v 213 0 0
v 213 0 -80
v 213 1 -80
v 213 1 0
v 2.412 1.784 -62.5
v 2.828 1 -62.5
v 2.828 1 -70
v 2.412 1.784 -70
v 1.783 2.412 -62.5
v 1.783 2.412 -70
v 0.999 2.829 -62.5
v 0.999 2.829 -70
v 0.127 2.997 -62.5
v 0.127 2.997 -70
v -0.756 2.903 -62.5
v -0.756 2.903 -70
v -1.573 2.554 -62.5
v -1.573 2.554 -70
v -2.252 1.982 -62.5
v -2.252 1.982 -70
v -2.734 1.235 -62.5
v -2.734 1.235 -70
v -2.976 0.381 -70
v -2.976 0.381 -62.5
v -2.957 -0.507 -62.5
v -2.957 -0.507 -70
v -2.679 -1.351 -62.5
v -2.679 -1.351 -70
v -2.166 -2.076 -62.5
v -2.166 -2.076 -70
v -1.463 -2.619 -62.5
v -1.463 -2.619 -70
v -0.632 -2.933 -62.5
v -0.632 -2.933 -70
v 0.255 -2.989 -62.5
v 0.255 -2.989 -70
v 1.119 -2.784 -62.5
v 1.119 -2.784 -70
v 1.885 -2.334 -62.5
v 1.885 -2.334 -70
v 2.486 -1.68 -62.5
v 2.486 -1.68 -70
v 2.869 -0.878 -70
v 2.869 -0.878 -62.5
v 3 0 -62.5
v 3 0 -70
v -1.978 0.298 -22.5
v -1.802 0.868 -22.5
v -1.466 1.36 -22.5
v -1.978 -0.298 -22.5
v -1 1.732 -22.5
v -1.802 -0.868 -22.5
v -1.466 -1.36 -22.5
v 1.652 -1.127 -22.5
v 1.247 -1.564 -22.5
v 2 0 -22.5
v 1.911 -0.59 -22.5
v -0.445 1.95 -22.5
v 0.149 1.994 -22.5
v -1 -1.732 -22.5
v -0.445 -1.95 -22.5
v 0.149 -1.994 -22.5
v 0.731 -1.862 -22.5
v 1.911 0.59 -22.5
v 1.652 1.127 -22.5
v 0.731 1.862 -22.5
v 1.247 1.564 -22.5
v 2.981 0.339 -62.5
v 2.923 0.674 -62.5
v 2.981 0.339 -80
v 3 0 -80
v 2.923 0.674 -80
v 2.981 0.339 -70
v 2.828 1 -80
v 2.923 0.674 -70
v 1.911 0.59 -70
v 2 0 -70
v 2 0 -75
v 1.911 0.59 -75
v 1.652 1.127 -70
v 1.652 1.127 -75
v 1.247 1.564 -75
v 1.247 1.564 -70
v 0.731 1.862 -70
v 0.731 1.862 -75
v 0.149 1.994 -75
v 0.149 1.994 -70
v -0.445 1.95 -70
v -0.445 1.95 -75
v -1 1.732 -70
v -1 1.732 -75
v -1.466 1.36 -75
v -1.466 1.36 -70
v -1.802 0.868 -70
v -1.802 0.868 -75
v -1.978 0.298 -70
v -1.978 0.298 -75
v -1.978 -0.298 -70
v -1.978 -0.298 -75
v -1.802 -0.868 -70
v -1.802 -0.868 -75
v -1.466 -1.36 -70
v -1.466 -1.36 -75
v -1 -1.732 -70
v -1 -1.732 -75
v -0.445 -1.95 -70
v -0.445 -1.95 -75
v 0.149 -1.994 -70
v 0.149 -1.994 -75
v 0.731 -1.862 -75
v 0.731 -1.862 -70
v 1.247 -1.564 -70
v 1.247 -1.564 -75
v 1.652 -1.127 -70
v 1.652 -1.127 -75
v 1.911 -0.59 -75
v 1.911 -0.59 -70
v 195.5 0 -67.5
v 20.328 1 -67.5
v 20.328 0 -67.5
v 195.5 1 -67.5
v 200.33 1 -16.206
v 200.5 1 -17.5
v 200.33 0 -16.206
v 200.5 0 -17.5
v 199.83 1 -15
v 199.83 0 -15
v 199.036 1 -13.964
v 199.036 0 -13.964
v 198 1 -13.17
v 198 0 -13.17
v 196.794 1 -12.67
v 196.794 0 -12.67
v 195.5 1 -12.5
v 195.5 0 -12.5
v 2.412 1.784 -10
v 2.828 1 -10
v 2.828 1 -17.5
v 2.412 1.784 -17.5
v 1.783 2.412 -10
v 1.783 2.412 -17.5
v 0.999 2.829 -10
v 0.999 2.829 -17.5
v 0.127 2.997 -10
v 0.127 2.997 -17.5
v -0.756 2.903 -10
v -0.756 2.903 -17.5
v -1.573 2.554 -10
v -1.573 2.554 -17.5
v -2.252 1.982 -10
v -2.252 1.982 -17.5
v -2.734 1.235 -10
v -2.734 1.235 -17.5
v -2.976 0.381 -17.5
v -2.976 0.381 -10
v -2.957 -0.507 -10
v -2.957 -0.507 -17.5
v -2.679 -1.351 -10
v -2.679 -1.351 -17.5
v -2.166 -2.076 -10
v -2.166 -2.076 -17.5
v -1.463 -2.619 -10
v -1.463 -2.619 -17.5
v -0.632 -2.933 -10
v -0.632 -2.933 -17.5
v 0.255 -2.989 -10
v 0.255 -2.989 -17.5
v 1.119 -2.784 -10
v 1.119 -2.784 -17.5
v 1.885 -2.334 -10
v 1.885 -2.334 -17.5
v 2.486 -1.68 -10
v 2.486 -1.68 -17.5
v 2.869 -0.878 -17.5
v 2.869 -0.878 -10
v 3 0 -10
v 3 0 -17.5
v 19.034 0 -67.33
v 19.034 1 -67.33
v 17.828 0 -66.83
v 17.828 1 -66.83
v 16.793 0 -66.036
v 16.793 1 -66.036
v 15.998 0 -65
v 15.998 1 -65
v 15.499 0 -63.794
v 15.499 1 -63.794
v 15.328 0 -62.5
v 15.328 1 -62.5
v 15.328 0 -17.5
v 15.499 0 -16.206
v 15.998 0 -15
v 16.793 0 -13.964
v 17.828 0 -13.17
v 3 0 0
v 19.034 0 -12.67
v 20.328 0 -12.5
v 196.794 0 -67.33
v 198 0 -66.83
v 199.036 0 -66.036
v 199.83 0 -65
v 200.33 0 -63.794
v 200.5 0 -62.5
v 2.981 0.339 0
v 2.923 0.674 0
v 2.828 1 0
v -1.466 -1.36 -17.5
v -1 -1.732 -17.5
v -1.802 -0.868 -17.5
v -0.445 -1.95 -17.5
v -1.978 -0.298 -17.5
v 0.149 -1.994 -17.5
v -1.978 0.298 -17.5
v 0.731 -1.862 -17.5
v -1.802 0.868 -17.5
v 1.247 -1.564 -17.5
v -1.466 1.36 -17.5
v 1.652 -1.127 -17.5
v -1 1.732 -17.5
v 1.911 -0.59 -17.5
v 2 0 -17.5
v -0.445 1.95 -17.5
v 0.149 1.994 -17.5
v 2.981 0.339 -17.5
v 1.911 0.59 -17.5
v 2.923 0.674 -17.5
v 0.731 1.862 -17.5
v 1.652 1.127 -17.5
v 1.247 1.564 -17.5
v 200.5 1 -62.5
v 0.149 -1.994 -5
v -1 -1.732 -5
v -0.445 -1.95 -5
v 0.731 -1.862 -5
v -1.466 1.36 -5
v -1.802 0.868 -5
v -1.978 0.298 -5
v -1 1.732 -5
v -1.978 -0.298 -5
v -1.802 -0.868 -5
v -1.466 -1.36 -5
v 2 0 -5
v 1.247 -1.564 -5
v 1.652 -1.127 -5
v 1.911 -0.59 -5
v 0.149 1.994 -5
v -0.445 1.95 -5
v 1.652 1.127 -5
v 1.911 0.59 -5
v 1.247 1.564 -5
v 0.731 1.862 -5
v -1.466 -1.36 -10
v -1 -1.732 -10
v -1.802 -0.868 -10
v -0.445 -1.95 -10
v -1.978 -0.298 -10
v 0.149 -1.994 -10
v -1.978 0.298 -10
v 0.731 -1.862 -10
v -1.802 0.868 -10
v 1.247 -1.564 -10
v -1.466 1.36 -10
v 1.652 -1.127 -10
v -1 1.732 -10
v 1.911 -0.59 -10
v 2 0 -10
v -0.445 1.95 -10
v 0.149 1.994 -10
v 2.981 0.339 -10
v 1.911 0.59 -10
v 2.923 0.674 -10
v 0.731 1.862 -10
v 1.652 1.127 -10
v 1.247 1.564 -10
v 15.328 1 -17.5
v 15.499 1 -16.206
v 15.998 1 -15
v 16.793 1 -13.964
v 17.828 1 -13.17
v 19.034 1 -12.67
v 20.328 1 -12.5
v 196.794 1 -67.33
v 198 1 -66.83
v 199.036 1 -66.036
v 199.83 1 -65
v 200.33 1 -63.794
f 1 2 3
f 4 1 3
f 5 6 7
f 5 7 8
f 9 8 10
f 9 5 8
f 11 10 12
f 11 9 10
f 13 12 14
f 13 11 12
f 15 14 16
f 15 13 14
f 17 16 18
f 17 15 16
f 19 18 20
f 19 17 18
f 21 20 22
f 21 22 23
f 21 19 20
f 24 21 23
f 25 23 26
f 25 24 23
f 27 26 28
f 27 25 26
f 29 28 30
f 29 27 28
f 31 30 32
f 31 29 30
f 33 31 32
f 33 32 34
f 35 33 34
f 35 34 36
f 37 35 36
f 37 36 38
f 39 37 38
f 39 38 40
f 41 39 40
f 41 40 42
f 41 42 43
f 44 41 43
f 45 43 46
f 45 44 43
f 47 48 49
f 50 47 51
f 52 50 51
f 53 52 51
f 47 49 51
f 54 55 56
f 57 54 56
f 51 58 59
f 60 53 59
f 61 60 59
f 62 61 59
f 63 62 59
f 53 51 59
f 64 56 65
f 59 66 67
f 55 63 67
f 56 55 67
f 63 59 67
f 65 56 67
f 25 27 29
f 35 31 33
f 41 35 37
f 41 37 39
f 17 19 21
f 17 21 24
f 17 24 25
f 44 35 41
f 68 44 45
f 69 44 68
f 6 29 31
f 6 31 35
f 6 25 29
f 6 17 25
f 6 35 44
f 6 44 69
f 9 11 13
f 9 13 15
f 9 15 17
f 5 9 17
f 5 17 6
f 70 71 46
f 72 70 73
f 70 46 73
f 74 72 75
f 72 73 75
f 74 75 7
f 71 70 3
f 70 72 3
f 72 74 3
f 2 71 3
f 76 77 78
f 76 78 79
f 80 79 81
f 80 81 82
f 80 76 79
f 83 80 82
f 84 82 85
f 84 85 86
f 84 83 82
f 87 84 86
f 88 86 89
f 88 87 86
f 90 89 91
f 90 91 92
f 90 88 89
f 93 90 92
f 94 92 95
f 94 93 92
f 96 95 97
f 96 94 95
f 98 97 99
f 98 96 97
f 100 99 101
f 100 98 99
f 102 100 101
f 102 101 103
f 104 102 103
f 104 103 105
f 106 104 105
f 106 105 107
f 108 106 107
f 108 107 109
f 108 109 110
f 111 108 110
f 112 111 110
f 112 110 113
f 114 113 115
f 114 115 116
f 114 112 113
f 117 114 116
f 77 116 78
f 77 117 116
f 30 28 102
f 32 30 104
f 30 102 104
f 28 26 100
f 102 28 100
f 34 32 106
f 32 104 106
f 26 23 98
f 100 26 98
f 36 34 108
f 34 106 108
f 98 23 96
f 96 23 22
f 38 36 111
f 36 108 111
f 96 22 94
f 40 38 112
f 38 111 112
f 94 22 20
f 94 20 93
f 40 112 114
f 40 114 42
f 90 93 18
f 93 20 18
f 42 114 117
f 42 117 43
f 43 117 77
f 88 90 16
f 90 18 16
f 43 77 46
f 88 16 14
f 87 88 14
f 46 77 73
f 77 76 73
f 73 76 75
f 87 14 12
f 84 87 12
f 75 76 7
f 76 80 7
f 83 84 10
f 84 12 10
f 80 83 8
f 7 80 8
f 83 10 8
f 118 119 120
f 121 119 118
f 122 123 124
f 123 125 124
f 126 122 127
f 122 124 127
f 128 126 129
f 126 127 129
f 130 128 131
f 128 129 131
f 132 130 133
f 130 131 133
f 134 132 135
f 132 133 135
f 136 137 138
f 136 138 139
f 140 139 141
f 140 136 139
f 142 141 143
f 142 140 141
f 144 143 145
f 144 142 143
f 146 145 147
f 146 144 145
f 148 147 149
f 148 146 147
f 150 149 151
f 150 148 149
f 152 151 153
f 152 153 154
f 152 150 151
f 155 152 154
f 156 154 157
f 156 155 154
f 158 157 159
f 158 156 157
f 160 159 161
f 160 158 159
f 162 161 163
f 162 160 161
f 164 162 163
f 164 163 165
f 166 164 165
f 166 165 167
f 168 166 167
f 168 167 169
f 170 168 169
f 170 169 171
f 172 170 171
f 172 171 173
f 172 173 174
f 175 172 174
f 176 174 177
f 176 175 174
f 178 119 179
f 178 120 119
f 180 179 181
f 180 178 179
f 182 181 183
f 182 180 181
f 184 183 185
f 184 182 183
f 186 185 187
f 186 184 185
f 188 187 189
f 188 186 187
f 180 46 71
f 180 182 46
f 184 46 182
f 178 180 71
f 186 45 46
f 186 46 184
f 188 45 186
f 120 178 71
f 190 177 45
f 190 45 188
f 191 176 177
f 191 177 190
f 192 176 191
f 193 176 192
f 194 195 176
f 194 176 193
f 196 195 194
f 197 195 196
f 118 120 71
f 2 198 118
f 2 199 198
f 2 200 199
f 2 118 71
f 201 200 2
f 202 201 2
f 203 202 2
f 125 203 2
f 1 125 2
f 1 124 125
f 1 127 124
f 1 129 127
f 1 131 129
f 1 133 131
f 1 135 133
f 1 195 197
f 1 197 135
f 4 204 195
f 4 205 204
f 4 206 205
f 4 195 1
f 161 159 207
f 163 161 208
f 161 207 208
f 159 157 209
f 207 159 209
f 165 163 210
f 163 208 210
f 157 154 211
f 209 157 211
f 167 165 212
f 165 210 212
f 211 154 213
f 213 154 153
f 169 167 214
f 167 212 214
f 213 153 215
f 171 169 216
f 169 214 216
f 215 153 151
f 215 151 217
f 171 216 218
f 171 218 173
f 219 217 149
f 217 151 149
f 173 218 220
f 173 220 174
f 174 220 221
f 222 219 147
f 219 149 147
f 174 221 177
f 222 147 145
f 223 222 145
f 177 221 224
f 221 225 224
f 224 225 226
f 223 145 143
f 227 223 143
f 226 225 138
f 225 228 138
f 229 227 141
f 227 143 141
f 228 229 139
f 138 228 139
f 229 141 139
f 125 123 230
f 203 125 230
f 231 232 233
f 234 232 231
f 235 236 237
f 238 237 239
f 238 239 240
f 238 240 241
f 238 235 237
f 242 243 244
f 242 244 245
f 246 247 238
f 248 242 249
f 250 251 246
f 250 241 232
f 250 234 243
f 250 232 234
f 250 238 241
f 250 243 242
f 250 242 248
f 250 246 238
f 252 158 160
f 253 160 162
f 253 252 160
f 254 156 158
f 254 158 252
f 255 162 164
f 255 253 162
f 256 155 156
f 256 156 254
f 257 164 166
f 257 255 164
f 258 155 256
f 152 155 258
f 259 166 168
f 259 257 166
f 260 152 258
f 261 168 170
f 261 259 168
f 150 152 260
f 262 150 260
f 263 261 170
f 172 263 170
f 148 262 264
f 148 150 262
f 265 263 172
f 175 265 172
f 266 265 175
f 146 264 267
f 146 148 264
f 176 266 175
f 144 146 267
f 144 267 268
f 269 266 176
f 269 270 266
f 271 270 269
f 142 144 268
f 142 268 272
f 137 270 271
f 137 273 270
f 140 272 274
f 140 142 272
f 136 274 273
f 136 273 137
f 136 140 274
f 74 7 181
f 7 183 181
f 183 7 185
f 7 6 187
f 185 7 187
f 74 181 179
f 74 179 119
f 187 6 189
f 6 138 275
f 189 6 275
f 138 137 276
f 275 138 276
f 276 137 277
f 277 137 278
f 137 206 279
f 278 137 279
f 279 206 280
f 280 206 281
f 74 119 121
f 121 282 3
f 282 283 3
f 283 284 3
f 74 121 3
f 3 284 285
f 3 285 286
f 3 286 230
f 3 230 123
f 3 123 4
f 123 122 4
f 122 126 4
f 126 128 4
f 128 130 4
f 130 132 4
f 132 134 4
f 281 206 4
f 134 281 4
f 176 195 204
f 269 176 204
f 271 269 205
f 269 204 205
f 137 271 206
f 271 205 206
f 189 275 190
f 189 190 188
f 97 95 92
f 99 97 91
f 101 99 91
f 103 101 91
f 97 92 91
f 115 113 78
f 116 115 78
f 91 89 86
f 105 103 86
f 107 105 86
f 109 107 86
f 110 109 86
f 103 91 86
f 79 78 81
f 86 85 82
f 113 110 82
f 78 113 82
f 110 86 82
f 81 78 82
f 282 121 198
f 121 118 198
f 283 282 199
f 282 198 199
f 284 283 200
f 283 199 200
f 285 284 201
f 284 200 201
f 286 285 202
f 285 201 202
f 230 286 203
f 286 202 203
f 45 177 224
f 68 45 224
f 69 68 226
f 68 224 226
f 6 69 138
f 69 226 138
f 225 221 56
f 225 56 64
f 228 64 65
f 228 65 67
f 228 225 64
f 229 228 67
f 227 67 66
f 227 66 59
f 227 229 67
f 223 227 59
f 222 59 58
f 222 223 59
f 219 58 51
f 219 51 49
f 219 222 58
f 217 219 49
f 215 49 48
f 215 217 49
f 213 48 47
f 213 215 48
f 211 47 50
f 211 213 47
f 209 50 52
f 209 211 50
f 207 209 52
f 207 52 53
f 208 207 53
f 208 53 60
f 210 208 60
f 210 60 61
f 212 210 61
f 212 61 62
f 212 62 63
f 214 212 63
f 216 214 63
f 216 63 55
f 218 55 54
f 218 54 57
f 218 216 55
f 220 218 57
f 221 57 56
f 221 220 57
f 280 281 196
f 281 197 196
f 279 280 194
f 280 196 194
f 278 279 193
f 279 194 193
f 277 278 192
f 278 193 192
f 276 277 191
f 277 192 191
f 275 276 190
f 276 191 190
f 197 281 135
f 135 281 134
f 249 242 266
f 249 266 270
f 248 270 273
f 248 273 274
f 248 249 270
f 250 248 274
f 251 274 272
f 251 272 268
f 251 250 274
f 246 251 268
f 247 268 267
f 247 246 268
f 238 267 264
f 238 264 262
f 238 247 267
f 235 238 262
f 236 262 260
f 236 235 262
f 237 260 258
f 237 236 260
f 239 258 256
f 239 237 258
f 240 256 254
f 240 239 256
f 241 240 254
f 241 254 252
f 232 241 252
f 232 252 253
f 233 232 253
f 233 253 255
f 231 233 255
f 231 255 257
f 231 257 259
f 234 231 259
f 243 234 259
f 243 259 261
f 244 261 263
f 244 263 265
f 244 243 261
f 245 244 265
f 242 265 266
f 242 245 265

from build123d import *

# Parameters (mm, degrees)
SKETCH3_R           = 2
BOSS_EXTRUDE2_DEPTH = 80
SKETCH3_18_R        = 3
SKETCH3_18_R_2      = 2
CUT_EXTRUDE1_DEPTH  = 5
BOSS_EXTRUDE3_START = -5
SKETCH3_19_R        = 2
BOSS_EXTRUDE3_DEPTH = 75
CUT_EXTRUDE2_START  = -5
SKETCH3_20_R        = 3
SKETCH3_20_R_2      = 2
CUT_EXTRUDE2_DEPTH  = 5
CUT_EXTRUDE3_START  = -17.5
SKETCH3_21_R        = 3
SKETCH3_21_R_2      = 2
CUT_EXTRUDE3_DEPTH  = 5
CUT_EXTRUDE4_START  = -22.5
SKETCH3_22_R        = 3
CUT_EXTRUDE4_DEPTH  = 35
CUT_EXTRUDE5_START  = -57.5
SKETCH3_23_R        = 3
SKETCH3_23_R_2      = 2
CUT_EXTRUDE5_DEPTH  = 5
CUT_EXTRUDE8_START  = -70
SKETCH3_26_R        = 3
SKETCH3_26_R_2      = 2
CUT_EXTRUDE8_DEPTH  = 5
CUT_EXTRUDE9_START  = -75
SKETCH3_27_R        = 3
CUT_EXTRUDE9_DEPTH  = 5
SKETCH4_W           = 185.171572875
SKETCH4_H           = 55
CUT_EXTRUDE10_DEPTH = 228.563178041
CUT_EXTRUDE11_START = -57.5
SKETCH3_28_R        = 2
CUT_EXTRUDE11_DEPTH = 5
FILLET4_R           = 5


with BuildPart() as part:
    # Sketch3 → Boss-Extrude2 (new body)
    with BuildSketch(Plane.XY):
        with BuildLine():
            ThreePointArc((2.828427125, 1), (-2.956795679, -0.507305936), (3, 0))
            Line((3, 0), (213, 0))
            Line((213, 0), (213, 1))
            Line((213, 1), (2.828427125, 1))
        make_face()
        Circle(SKETCH3_R, mode=Mode.SUBTRACT)
    extrude(amount=-BOSS_EXTRUDE2_DEPTH)

    # Sketch3<18> → Cut-Extrude1 (cut)
    with BuildSketch(Plane.XY):
        Circle(SKETCH3_18_R)
        Circle(SKETCH3_18_R_2, mode=Mode.SUBTRACT)
    extrude(amount=-CUT_EXTRUDE1_DEPTH, mode=Mode.SUBTRACT)

    # Sketch3<19> → Boss-Extrude3 (add)
    with BuildSketch(Plane.XY.offset(BOSS_EXTRUDE3_START)):
        Circle(SKETCH3_19_R)
    extrude(amount=-BOSS_EXTRUDE3_DEPTH)

    # Sketch3<20> → Cut-Extrude2 (cut)
    with BuildSketch(Plane.XY.offset(CUT_EXTRUDE2_START)):
        Circle(SKETCH3_20_R)
        Circle(SKETCH3_20_R_2, mode=Mode.SUBTRACT)
    extrude(amount=-CUT_EXTRUDE2_DEPTH, mode=Mode.SUBTRACT)

    # Sketch3<21> → Cut-Extrude3 (cut)
    with BuildSketch(Plane.XY.offset(CUT_EXTRUDE3_START)):
        Circle(SKETCH3_21_R)
        Circle(SKETCH3_21_R_2, mode=Mode.SUBTRACT)
    extrude(amount=-CUT_EXTRUDE3_DEPTH, mode=Mode.SUBTRACT)

    # Sketch3<22> → Cut-Extrude4 (cut)
    with BuildSketch(Plane.XY.offset(CUT_EXTRUDE4_START)):
        Circle(SKETCH3_22_R)
    extrude(amount=-CUT_EXTRUDE4_DEPTH, mode=Mode.SUBTRACT)

    # Sketch3<23> → Cut-Extrude5 (cut)
    with BuildSketch(Plane.XY.offset(CUT_EXTRUDE5_START)):
        Circle(SKETCH3_23_R)
        Circle(SKETCH3_23_R_2, mode=Mode.SUBTRACT)
    extrude(amount=-CUT_EXTRUDE5_DEPTH, mode=Mode.SUBTRACT)

    # Sketch3<26> → Cut-Extrude8 (cut)
    with BuildSketch(Plane.XY.offset(CUT_EXTRUDE8_START)):
        Circle(SKETCH3_26_R)
        Circle(SKETCH3_26_R_2, mode=Mode.SUBTRACT)
    extrude(amount=-CUT_EXTRUDE8_DEPTH, mode=Mode.SUBTRACT)

    # Sketch3<27> → Cut-Extrude9 (cut)
    with BuildSketch(Plane.XY.offset(CUT_EXTRUDE9_START)):
        Circle(SKETCH3_27_R)
    extrude(amount=-CUT_EXTRUDE9_DEPTH, mode=Mode.SUBTRACT)

    # Sketch4 → Cut-Extrude10 (cut, through all)
    with BuildSketch(Plane(origin=(0, 1, 0), x_dir=(1, 0, 0), z_dir=(0, 1, 0))):
        with Locations((107.914213562, 40)):
            Rectangle(SKETCH4_W, SKETCH4_H)
    extrude(amount=-CUT_EXTRUDE10_DEPTH, mode=Mode.SUBTRACT)

    # Sketch3<28> → Cut-Extrude11 (cut)
    with BuildSketch(Plane.XY.offset(CUT_EXTRUDE11_START)):
        Circle(SKETCH3_28_R)
    extrude(amount=-CUT_EXTRUDE11_DEPTH, mode=Mode.SUBTRACT)

    # Fillet4
    fillet4_edges = [part.edges().sort_by_distance(p)[0] for p in [
        (200.5, 0.5, -12.5),
        (200.5, 0.5, -67.5),
        (15.328427125, 0.5, -12.5),
        (15.328427125, 0.5, -67.5),
    ]]
    fillet(fillet4_edges, radius=FILLET4_R)


solid = part.part
